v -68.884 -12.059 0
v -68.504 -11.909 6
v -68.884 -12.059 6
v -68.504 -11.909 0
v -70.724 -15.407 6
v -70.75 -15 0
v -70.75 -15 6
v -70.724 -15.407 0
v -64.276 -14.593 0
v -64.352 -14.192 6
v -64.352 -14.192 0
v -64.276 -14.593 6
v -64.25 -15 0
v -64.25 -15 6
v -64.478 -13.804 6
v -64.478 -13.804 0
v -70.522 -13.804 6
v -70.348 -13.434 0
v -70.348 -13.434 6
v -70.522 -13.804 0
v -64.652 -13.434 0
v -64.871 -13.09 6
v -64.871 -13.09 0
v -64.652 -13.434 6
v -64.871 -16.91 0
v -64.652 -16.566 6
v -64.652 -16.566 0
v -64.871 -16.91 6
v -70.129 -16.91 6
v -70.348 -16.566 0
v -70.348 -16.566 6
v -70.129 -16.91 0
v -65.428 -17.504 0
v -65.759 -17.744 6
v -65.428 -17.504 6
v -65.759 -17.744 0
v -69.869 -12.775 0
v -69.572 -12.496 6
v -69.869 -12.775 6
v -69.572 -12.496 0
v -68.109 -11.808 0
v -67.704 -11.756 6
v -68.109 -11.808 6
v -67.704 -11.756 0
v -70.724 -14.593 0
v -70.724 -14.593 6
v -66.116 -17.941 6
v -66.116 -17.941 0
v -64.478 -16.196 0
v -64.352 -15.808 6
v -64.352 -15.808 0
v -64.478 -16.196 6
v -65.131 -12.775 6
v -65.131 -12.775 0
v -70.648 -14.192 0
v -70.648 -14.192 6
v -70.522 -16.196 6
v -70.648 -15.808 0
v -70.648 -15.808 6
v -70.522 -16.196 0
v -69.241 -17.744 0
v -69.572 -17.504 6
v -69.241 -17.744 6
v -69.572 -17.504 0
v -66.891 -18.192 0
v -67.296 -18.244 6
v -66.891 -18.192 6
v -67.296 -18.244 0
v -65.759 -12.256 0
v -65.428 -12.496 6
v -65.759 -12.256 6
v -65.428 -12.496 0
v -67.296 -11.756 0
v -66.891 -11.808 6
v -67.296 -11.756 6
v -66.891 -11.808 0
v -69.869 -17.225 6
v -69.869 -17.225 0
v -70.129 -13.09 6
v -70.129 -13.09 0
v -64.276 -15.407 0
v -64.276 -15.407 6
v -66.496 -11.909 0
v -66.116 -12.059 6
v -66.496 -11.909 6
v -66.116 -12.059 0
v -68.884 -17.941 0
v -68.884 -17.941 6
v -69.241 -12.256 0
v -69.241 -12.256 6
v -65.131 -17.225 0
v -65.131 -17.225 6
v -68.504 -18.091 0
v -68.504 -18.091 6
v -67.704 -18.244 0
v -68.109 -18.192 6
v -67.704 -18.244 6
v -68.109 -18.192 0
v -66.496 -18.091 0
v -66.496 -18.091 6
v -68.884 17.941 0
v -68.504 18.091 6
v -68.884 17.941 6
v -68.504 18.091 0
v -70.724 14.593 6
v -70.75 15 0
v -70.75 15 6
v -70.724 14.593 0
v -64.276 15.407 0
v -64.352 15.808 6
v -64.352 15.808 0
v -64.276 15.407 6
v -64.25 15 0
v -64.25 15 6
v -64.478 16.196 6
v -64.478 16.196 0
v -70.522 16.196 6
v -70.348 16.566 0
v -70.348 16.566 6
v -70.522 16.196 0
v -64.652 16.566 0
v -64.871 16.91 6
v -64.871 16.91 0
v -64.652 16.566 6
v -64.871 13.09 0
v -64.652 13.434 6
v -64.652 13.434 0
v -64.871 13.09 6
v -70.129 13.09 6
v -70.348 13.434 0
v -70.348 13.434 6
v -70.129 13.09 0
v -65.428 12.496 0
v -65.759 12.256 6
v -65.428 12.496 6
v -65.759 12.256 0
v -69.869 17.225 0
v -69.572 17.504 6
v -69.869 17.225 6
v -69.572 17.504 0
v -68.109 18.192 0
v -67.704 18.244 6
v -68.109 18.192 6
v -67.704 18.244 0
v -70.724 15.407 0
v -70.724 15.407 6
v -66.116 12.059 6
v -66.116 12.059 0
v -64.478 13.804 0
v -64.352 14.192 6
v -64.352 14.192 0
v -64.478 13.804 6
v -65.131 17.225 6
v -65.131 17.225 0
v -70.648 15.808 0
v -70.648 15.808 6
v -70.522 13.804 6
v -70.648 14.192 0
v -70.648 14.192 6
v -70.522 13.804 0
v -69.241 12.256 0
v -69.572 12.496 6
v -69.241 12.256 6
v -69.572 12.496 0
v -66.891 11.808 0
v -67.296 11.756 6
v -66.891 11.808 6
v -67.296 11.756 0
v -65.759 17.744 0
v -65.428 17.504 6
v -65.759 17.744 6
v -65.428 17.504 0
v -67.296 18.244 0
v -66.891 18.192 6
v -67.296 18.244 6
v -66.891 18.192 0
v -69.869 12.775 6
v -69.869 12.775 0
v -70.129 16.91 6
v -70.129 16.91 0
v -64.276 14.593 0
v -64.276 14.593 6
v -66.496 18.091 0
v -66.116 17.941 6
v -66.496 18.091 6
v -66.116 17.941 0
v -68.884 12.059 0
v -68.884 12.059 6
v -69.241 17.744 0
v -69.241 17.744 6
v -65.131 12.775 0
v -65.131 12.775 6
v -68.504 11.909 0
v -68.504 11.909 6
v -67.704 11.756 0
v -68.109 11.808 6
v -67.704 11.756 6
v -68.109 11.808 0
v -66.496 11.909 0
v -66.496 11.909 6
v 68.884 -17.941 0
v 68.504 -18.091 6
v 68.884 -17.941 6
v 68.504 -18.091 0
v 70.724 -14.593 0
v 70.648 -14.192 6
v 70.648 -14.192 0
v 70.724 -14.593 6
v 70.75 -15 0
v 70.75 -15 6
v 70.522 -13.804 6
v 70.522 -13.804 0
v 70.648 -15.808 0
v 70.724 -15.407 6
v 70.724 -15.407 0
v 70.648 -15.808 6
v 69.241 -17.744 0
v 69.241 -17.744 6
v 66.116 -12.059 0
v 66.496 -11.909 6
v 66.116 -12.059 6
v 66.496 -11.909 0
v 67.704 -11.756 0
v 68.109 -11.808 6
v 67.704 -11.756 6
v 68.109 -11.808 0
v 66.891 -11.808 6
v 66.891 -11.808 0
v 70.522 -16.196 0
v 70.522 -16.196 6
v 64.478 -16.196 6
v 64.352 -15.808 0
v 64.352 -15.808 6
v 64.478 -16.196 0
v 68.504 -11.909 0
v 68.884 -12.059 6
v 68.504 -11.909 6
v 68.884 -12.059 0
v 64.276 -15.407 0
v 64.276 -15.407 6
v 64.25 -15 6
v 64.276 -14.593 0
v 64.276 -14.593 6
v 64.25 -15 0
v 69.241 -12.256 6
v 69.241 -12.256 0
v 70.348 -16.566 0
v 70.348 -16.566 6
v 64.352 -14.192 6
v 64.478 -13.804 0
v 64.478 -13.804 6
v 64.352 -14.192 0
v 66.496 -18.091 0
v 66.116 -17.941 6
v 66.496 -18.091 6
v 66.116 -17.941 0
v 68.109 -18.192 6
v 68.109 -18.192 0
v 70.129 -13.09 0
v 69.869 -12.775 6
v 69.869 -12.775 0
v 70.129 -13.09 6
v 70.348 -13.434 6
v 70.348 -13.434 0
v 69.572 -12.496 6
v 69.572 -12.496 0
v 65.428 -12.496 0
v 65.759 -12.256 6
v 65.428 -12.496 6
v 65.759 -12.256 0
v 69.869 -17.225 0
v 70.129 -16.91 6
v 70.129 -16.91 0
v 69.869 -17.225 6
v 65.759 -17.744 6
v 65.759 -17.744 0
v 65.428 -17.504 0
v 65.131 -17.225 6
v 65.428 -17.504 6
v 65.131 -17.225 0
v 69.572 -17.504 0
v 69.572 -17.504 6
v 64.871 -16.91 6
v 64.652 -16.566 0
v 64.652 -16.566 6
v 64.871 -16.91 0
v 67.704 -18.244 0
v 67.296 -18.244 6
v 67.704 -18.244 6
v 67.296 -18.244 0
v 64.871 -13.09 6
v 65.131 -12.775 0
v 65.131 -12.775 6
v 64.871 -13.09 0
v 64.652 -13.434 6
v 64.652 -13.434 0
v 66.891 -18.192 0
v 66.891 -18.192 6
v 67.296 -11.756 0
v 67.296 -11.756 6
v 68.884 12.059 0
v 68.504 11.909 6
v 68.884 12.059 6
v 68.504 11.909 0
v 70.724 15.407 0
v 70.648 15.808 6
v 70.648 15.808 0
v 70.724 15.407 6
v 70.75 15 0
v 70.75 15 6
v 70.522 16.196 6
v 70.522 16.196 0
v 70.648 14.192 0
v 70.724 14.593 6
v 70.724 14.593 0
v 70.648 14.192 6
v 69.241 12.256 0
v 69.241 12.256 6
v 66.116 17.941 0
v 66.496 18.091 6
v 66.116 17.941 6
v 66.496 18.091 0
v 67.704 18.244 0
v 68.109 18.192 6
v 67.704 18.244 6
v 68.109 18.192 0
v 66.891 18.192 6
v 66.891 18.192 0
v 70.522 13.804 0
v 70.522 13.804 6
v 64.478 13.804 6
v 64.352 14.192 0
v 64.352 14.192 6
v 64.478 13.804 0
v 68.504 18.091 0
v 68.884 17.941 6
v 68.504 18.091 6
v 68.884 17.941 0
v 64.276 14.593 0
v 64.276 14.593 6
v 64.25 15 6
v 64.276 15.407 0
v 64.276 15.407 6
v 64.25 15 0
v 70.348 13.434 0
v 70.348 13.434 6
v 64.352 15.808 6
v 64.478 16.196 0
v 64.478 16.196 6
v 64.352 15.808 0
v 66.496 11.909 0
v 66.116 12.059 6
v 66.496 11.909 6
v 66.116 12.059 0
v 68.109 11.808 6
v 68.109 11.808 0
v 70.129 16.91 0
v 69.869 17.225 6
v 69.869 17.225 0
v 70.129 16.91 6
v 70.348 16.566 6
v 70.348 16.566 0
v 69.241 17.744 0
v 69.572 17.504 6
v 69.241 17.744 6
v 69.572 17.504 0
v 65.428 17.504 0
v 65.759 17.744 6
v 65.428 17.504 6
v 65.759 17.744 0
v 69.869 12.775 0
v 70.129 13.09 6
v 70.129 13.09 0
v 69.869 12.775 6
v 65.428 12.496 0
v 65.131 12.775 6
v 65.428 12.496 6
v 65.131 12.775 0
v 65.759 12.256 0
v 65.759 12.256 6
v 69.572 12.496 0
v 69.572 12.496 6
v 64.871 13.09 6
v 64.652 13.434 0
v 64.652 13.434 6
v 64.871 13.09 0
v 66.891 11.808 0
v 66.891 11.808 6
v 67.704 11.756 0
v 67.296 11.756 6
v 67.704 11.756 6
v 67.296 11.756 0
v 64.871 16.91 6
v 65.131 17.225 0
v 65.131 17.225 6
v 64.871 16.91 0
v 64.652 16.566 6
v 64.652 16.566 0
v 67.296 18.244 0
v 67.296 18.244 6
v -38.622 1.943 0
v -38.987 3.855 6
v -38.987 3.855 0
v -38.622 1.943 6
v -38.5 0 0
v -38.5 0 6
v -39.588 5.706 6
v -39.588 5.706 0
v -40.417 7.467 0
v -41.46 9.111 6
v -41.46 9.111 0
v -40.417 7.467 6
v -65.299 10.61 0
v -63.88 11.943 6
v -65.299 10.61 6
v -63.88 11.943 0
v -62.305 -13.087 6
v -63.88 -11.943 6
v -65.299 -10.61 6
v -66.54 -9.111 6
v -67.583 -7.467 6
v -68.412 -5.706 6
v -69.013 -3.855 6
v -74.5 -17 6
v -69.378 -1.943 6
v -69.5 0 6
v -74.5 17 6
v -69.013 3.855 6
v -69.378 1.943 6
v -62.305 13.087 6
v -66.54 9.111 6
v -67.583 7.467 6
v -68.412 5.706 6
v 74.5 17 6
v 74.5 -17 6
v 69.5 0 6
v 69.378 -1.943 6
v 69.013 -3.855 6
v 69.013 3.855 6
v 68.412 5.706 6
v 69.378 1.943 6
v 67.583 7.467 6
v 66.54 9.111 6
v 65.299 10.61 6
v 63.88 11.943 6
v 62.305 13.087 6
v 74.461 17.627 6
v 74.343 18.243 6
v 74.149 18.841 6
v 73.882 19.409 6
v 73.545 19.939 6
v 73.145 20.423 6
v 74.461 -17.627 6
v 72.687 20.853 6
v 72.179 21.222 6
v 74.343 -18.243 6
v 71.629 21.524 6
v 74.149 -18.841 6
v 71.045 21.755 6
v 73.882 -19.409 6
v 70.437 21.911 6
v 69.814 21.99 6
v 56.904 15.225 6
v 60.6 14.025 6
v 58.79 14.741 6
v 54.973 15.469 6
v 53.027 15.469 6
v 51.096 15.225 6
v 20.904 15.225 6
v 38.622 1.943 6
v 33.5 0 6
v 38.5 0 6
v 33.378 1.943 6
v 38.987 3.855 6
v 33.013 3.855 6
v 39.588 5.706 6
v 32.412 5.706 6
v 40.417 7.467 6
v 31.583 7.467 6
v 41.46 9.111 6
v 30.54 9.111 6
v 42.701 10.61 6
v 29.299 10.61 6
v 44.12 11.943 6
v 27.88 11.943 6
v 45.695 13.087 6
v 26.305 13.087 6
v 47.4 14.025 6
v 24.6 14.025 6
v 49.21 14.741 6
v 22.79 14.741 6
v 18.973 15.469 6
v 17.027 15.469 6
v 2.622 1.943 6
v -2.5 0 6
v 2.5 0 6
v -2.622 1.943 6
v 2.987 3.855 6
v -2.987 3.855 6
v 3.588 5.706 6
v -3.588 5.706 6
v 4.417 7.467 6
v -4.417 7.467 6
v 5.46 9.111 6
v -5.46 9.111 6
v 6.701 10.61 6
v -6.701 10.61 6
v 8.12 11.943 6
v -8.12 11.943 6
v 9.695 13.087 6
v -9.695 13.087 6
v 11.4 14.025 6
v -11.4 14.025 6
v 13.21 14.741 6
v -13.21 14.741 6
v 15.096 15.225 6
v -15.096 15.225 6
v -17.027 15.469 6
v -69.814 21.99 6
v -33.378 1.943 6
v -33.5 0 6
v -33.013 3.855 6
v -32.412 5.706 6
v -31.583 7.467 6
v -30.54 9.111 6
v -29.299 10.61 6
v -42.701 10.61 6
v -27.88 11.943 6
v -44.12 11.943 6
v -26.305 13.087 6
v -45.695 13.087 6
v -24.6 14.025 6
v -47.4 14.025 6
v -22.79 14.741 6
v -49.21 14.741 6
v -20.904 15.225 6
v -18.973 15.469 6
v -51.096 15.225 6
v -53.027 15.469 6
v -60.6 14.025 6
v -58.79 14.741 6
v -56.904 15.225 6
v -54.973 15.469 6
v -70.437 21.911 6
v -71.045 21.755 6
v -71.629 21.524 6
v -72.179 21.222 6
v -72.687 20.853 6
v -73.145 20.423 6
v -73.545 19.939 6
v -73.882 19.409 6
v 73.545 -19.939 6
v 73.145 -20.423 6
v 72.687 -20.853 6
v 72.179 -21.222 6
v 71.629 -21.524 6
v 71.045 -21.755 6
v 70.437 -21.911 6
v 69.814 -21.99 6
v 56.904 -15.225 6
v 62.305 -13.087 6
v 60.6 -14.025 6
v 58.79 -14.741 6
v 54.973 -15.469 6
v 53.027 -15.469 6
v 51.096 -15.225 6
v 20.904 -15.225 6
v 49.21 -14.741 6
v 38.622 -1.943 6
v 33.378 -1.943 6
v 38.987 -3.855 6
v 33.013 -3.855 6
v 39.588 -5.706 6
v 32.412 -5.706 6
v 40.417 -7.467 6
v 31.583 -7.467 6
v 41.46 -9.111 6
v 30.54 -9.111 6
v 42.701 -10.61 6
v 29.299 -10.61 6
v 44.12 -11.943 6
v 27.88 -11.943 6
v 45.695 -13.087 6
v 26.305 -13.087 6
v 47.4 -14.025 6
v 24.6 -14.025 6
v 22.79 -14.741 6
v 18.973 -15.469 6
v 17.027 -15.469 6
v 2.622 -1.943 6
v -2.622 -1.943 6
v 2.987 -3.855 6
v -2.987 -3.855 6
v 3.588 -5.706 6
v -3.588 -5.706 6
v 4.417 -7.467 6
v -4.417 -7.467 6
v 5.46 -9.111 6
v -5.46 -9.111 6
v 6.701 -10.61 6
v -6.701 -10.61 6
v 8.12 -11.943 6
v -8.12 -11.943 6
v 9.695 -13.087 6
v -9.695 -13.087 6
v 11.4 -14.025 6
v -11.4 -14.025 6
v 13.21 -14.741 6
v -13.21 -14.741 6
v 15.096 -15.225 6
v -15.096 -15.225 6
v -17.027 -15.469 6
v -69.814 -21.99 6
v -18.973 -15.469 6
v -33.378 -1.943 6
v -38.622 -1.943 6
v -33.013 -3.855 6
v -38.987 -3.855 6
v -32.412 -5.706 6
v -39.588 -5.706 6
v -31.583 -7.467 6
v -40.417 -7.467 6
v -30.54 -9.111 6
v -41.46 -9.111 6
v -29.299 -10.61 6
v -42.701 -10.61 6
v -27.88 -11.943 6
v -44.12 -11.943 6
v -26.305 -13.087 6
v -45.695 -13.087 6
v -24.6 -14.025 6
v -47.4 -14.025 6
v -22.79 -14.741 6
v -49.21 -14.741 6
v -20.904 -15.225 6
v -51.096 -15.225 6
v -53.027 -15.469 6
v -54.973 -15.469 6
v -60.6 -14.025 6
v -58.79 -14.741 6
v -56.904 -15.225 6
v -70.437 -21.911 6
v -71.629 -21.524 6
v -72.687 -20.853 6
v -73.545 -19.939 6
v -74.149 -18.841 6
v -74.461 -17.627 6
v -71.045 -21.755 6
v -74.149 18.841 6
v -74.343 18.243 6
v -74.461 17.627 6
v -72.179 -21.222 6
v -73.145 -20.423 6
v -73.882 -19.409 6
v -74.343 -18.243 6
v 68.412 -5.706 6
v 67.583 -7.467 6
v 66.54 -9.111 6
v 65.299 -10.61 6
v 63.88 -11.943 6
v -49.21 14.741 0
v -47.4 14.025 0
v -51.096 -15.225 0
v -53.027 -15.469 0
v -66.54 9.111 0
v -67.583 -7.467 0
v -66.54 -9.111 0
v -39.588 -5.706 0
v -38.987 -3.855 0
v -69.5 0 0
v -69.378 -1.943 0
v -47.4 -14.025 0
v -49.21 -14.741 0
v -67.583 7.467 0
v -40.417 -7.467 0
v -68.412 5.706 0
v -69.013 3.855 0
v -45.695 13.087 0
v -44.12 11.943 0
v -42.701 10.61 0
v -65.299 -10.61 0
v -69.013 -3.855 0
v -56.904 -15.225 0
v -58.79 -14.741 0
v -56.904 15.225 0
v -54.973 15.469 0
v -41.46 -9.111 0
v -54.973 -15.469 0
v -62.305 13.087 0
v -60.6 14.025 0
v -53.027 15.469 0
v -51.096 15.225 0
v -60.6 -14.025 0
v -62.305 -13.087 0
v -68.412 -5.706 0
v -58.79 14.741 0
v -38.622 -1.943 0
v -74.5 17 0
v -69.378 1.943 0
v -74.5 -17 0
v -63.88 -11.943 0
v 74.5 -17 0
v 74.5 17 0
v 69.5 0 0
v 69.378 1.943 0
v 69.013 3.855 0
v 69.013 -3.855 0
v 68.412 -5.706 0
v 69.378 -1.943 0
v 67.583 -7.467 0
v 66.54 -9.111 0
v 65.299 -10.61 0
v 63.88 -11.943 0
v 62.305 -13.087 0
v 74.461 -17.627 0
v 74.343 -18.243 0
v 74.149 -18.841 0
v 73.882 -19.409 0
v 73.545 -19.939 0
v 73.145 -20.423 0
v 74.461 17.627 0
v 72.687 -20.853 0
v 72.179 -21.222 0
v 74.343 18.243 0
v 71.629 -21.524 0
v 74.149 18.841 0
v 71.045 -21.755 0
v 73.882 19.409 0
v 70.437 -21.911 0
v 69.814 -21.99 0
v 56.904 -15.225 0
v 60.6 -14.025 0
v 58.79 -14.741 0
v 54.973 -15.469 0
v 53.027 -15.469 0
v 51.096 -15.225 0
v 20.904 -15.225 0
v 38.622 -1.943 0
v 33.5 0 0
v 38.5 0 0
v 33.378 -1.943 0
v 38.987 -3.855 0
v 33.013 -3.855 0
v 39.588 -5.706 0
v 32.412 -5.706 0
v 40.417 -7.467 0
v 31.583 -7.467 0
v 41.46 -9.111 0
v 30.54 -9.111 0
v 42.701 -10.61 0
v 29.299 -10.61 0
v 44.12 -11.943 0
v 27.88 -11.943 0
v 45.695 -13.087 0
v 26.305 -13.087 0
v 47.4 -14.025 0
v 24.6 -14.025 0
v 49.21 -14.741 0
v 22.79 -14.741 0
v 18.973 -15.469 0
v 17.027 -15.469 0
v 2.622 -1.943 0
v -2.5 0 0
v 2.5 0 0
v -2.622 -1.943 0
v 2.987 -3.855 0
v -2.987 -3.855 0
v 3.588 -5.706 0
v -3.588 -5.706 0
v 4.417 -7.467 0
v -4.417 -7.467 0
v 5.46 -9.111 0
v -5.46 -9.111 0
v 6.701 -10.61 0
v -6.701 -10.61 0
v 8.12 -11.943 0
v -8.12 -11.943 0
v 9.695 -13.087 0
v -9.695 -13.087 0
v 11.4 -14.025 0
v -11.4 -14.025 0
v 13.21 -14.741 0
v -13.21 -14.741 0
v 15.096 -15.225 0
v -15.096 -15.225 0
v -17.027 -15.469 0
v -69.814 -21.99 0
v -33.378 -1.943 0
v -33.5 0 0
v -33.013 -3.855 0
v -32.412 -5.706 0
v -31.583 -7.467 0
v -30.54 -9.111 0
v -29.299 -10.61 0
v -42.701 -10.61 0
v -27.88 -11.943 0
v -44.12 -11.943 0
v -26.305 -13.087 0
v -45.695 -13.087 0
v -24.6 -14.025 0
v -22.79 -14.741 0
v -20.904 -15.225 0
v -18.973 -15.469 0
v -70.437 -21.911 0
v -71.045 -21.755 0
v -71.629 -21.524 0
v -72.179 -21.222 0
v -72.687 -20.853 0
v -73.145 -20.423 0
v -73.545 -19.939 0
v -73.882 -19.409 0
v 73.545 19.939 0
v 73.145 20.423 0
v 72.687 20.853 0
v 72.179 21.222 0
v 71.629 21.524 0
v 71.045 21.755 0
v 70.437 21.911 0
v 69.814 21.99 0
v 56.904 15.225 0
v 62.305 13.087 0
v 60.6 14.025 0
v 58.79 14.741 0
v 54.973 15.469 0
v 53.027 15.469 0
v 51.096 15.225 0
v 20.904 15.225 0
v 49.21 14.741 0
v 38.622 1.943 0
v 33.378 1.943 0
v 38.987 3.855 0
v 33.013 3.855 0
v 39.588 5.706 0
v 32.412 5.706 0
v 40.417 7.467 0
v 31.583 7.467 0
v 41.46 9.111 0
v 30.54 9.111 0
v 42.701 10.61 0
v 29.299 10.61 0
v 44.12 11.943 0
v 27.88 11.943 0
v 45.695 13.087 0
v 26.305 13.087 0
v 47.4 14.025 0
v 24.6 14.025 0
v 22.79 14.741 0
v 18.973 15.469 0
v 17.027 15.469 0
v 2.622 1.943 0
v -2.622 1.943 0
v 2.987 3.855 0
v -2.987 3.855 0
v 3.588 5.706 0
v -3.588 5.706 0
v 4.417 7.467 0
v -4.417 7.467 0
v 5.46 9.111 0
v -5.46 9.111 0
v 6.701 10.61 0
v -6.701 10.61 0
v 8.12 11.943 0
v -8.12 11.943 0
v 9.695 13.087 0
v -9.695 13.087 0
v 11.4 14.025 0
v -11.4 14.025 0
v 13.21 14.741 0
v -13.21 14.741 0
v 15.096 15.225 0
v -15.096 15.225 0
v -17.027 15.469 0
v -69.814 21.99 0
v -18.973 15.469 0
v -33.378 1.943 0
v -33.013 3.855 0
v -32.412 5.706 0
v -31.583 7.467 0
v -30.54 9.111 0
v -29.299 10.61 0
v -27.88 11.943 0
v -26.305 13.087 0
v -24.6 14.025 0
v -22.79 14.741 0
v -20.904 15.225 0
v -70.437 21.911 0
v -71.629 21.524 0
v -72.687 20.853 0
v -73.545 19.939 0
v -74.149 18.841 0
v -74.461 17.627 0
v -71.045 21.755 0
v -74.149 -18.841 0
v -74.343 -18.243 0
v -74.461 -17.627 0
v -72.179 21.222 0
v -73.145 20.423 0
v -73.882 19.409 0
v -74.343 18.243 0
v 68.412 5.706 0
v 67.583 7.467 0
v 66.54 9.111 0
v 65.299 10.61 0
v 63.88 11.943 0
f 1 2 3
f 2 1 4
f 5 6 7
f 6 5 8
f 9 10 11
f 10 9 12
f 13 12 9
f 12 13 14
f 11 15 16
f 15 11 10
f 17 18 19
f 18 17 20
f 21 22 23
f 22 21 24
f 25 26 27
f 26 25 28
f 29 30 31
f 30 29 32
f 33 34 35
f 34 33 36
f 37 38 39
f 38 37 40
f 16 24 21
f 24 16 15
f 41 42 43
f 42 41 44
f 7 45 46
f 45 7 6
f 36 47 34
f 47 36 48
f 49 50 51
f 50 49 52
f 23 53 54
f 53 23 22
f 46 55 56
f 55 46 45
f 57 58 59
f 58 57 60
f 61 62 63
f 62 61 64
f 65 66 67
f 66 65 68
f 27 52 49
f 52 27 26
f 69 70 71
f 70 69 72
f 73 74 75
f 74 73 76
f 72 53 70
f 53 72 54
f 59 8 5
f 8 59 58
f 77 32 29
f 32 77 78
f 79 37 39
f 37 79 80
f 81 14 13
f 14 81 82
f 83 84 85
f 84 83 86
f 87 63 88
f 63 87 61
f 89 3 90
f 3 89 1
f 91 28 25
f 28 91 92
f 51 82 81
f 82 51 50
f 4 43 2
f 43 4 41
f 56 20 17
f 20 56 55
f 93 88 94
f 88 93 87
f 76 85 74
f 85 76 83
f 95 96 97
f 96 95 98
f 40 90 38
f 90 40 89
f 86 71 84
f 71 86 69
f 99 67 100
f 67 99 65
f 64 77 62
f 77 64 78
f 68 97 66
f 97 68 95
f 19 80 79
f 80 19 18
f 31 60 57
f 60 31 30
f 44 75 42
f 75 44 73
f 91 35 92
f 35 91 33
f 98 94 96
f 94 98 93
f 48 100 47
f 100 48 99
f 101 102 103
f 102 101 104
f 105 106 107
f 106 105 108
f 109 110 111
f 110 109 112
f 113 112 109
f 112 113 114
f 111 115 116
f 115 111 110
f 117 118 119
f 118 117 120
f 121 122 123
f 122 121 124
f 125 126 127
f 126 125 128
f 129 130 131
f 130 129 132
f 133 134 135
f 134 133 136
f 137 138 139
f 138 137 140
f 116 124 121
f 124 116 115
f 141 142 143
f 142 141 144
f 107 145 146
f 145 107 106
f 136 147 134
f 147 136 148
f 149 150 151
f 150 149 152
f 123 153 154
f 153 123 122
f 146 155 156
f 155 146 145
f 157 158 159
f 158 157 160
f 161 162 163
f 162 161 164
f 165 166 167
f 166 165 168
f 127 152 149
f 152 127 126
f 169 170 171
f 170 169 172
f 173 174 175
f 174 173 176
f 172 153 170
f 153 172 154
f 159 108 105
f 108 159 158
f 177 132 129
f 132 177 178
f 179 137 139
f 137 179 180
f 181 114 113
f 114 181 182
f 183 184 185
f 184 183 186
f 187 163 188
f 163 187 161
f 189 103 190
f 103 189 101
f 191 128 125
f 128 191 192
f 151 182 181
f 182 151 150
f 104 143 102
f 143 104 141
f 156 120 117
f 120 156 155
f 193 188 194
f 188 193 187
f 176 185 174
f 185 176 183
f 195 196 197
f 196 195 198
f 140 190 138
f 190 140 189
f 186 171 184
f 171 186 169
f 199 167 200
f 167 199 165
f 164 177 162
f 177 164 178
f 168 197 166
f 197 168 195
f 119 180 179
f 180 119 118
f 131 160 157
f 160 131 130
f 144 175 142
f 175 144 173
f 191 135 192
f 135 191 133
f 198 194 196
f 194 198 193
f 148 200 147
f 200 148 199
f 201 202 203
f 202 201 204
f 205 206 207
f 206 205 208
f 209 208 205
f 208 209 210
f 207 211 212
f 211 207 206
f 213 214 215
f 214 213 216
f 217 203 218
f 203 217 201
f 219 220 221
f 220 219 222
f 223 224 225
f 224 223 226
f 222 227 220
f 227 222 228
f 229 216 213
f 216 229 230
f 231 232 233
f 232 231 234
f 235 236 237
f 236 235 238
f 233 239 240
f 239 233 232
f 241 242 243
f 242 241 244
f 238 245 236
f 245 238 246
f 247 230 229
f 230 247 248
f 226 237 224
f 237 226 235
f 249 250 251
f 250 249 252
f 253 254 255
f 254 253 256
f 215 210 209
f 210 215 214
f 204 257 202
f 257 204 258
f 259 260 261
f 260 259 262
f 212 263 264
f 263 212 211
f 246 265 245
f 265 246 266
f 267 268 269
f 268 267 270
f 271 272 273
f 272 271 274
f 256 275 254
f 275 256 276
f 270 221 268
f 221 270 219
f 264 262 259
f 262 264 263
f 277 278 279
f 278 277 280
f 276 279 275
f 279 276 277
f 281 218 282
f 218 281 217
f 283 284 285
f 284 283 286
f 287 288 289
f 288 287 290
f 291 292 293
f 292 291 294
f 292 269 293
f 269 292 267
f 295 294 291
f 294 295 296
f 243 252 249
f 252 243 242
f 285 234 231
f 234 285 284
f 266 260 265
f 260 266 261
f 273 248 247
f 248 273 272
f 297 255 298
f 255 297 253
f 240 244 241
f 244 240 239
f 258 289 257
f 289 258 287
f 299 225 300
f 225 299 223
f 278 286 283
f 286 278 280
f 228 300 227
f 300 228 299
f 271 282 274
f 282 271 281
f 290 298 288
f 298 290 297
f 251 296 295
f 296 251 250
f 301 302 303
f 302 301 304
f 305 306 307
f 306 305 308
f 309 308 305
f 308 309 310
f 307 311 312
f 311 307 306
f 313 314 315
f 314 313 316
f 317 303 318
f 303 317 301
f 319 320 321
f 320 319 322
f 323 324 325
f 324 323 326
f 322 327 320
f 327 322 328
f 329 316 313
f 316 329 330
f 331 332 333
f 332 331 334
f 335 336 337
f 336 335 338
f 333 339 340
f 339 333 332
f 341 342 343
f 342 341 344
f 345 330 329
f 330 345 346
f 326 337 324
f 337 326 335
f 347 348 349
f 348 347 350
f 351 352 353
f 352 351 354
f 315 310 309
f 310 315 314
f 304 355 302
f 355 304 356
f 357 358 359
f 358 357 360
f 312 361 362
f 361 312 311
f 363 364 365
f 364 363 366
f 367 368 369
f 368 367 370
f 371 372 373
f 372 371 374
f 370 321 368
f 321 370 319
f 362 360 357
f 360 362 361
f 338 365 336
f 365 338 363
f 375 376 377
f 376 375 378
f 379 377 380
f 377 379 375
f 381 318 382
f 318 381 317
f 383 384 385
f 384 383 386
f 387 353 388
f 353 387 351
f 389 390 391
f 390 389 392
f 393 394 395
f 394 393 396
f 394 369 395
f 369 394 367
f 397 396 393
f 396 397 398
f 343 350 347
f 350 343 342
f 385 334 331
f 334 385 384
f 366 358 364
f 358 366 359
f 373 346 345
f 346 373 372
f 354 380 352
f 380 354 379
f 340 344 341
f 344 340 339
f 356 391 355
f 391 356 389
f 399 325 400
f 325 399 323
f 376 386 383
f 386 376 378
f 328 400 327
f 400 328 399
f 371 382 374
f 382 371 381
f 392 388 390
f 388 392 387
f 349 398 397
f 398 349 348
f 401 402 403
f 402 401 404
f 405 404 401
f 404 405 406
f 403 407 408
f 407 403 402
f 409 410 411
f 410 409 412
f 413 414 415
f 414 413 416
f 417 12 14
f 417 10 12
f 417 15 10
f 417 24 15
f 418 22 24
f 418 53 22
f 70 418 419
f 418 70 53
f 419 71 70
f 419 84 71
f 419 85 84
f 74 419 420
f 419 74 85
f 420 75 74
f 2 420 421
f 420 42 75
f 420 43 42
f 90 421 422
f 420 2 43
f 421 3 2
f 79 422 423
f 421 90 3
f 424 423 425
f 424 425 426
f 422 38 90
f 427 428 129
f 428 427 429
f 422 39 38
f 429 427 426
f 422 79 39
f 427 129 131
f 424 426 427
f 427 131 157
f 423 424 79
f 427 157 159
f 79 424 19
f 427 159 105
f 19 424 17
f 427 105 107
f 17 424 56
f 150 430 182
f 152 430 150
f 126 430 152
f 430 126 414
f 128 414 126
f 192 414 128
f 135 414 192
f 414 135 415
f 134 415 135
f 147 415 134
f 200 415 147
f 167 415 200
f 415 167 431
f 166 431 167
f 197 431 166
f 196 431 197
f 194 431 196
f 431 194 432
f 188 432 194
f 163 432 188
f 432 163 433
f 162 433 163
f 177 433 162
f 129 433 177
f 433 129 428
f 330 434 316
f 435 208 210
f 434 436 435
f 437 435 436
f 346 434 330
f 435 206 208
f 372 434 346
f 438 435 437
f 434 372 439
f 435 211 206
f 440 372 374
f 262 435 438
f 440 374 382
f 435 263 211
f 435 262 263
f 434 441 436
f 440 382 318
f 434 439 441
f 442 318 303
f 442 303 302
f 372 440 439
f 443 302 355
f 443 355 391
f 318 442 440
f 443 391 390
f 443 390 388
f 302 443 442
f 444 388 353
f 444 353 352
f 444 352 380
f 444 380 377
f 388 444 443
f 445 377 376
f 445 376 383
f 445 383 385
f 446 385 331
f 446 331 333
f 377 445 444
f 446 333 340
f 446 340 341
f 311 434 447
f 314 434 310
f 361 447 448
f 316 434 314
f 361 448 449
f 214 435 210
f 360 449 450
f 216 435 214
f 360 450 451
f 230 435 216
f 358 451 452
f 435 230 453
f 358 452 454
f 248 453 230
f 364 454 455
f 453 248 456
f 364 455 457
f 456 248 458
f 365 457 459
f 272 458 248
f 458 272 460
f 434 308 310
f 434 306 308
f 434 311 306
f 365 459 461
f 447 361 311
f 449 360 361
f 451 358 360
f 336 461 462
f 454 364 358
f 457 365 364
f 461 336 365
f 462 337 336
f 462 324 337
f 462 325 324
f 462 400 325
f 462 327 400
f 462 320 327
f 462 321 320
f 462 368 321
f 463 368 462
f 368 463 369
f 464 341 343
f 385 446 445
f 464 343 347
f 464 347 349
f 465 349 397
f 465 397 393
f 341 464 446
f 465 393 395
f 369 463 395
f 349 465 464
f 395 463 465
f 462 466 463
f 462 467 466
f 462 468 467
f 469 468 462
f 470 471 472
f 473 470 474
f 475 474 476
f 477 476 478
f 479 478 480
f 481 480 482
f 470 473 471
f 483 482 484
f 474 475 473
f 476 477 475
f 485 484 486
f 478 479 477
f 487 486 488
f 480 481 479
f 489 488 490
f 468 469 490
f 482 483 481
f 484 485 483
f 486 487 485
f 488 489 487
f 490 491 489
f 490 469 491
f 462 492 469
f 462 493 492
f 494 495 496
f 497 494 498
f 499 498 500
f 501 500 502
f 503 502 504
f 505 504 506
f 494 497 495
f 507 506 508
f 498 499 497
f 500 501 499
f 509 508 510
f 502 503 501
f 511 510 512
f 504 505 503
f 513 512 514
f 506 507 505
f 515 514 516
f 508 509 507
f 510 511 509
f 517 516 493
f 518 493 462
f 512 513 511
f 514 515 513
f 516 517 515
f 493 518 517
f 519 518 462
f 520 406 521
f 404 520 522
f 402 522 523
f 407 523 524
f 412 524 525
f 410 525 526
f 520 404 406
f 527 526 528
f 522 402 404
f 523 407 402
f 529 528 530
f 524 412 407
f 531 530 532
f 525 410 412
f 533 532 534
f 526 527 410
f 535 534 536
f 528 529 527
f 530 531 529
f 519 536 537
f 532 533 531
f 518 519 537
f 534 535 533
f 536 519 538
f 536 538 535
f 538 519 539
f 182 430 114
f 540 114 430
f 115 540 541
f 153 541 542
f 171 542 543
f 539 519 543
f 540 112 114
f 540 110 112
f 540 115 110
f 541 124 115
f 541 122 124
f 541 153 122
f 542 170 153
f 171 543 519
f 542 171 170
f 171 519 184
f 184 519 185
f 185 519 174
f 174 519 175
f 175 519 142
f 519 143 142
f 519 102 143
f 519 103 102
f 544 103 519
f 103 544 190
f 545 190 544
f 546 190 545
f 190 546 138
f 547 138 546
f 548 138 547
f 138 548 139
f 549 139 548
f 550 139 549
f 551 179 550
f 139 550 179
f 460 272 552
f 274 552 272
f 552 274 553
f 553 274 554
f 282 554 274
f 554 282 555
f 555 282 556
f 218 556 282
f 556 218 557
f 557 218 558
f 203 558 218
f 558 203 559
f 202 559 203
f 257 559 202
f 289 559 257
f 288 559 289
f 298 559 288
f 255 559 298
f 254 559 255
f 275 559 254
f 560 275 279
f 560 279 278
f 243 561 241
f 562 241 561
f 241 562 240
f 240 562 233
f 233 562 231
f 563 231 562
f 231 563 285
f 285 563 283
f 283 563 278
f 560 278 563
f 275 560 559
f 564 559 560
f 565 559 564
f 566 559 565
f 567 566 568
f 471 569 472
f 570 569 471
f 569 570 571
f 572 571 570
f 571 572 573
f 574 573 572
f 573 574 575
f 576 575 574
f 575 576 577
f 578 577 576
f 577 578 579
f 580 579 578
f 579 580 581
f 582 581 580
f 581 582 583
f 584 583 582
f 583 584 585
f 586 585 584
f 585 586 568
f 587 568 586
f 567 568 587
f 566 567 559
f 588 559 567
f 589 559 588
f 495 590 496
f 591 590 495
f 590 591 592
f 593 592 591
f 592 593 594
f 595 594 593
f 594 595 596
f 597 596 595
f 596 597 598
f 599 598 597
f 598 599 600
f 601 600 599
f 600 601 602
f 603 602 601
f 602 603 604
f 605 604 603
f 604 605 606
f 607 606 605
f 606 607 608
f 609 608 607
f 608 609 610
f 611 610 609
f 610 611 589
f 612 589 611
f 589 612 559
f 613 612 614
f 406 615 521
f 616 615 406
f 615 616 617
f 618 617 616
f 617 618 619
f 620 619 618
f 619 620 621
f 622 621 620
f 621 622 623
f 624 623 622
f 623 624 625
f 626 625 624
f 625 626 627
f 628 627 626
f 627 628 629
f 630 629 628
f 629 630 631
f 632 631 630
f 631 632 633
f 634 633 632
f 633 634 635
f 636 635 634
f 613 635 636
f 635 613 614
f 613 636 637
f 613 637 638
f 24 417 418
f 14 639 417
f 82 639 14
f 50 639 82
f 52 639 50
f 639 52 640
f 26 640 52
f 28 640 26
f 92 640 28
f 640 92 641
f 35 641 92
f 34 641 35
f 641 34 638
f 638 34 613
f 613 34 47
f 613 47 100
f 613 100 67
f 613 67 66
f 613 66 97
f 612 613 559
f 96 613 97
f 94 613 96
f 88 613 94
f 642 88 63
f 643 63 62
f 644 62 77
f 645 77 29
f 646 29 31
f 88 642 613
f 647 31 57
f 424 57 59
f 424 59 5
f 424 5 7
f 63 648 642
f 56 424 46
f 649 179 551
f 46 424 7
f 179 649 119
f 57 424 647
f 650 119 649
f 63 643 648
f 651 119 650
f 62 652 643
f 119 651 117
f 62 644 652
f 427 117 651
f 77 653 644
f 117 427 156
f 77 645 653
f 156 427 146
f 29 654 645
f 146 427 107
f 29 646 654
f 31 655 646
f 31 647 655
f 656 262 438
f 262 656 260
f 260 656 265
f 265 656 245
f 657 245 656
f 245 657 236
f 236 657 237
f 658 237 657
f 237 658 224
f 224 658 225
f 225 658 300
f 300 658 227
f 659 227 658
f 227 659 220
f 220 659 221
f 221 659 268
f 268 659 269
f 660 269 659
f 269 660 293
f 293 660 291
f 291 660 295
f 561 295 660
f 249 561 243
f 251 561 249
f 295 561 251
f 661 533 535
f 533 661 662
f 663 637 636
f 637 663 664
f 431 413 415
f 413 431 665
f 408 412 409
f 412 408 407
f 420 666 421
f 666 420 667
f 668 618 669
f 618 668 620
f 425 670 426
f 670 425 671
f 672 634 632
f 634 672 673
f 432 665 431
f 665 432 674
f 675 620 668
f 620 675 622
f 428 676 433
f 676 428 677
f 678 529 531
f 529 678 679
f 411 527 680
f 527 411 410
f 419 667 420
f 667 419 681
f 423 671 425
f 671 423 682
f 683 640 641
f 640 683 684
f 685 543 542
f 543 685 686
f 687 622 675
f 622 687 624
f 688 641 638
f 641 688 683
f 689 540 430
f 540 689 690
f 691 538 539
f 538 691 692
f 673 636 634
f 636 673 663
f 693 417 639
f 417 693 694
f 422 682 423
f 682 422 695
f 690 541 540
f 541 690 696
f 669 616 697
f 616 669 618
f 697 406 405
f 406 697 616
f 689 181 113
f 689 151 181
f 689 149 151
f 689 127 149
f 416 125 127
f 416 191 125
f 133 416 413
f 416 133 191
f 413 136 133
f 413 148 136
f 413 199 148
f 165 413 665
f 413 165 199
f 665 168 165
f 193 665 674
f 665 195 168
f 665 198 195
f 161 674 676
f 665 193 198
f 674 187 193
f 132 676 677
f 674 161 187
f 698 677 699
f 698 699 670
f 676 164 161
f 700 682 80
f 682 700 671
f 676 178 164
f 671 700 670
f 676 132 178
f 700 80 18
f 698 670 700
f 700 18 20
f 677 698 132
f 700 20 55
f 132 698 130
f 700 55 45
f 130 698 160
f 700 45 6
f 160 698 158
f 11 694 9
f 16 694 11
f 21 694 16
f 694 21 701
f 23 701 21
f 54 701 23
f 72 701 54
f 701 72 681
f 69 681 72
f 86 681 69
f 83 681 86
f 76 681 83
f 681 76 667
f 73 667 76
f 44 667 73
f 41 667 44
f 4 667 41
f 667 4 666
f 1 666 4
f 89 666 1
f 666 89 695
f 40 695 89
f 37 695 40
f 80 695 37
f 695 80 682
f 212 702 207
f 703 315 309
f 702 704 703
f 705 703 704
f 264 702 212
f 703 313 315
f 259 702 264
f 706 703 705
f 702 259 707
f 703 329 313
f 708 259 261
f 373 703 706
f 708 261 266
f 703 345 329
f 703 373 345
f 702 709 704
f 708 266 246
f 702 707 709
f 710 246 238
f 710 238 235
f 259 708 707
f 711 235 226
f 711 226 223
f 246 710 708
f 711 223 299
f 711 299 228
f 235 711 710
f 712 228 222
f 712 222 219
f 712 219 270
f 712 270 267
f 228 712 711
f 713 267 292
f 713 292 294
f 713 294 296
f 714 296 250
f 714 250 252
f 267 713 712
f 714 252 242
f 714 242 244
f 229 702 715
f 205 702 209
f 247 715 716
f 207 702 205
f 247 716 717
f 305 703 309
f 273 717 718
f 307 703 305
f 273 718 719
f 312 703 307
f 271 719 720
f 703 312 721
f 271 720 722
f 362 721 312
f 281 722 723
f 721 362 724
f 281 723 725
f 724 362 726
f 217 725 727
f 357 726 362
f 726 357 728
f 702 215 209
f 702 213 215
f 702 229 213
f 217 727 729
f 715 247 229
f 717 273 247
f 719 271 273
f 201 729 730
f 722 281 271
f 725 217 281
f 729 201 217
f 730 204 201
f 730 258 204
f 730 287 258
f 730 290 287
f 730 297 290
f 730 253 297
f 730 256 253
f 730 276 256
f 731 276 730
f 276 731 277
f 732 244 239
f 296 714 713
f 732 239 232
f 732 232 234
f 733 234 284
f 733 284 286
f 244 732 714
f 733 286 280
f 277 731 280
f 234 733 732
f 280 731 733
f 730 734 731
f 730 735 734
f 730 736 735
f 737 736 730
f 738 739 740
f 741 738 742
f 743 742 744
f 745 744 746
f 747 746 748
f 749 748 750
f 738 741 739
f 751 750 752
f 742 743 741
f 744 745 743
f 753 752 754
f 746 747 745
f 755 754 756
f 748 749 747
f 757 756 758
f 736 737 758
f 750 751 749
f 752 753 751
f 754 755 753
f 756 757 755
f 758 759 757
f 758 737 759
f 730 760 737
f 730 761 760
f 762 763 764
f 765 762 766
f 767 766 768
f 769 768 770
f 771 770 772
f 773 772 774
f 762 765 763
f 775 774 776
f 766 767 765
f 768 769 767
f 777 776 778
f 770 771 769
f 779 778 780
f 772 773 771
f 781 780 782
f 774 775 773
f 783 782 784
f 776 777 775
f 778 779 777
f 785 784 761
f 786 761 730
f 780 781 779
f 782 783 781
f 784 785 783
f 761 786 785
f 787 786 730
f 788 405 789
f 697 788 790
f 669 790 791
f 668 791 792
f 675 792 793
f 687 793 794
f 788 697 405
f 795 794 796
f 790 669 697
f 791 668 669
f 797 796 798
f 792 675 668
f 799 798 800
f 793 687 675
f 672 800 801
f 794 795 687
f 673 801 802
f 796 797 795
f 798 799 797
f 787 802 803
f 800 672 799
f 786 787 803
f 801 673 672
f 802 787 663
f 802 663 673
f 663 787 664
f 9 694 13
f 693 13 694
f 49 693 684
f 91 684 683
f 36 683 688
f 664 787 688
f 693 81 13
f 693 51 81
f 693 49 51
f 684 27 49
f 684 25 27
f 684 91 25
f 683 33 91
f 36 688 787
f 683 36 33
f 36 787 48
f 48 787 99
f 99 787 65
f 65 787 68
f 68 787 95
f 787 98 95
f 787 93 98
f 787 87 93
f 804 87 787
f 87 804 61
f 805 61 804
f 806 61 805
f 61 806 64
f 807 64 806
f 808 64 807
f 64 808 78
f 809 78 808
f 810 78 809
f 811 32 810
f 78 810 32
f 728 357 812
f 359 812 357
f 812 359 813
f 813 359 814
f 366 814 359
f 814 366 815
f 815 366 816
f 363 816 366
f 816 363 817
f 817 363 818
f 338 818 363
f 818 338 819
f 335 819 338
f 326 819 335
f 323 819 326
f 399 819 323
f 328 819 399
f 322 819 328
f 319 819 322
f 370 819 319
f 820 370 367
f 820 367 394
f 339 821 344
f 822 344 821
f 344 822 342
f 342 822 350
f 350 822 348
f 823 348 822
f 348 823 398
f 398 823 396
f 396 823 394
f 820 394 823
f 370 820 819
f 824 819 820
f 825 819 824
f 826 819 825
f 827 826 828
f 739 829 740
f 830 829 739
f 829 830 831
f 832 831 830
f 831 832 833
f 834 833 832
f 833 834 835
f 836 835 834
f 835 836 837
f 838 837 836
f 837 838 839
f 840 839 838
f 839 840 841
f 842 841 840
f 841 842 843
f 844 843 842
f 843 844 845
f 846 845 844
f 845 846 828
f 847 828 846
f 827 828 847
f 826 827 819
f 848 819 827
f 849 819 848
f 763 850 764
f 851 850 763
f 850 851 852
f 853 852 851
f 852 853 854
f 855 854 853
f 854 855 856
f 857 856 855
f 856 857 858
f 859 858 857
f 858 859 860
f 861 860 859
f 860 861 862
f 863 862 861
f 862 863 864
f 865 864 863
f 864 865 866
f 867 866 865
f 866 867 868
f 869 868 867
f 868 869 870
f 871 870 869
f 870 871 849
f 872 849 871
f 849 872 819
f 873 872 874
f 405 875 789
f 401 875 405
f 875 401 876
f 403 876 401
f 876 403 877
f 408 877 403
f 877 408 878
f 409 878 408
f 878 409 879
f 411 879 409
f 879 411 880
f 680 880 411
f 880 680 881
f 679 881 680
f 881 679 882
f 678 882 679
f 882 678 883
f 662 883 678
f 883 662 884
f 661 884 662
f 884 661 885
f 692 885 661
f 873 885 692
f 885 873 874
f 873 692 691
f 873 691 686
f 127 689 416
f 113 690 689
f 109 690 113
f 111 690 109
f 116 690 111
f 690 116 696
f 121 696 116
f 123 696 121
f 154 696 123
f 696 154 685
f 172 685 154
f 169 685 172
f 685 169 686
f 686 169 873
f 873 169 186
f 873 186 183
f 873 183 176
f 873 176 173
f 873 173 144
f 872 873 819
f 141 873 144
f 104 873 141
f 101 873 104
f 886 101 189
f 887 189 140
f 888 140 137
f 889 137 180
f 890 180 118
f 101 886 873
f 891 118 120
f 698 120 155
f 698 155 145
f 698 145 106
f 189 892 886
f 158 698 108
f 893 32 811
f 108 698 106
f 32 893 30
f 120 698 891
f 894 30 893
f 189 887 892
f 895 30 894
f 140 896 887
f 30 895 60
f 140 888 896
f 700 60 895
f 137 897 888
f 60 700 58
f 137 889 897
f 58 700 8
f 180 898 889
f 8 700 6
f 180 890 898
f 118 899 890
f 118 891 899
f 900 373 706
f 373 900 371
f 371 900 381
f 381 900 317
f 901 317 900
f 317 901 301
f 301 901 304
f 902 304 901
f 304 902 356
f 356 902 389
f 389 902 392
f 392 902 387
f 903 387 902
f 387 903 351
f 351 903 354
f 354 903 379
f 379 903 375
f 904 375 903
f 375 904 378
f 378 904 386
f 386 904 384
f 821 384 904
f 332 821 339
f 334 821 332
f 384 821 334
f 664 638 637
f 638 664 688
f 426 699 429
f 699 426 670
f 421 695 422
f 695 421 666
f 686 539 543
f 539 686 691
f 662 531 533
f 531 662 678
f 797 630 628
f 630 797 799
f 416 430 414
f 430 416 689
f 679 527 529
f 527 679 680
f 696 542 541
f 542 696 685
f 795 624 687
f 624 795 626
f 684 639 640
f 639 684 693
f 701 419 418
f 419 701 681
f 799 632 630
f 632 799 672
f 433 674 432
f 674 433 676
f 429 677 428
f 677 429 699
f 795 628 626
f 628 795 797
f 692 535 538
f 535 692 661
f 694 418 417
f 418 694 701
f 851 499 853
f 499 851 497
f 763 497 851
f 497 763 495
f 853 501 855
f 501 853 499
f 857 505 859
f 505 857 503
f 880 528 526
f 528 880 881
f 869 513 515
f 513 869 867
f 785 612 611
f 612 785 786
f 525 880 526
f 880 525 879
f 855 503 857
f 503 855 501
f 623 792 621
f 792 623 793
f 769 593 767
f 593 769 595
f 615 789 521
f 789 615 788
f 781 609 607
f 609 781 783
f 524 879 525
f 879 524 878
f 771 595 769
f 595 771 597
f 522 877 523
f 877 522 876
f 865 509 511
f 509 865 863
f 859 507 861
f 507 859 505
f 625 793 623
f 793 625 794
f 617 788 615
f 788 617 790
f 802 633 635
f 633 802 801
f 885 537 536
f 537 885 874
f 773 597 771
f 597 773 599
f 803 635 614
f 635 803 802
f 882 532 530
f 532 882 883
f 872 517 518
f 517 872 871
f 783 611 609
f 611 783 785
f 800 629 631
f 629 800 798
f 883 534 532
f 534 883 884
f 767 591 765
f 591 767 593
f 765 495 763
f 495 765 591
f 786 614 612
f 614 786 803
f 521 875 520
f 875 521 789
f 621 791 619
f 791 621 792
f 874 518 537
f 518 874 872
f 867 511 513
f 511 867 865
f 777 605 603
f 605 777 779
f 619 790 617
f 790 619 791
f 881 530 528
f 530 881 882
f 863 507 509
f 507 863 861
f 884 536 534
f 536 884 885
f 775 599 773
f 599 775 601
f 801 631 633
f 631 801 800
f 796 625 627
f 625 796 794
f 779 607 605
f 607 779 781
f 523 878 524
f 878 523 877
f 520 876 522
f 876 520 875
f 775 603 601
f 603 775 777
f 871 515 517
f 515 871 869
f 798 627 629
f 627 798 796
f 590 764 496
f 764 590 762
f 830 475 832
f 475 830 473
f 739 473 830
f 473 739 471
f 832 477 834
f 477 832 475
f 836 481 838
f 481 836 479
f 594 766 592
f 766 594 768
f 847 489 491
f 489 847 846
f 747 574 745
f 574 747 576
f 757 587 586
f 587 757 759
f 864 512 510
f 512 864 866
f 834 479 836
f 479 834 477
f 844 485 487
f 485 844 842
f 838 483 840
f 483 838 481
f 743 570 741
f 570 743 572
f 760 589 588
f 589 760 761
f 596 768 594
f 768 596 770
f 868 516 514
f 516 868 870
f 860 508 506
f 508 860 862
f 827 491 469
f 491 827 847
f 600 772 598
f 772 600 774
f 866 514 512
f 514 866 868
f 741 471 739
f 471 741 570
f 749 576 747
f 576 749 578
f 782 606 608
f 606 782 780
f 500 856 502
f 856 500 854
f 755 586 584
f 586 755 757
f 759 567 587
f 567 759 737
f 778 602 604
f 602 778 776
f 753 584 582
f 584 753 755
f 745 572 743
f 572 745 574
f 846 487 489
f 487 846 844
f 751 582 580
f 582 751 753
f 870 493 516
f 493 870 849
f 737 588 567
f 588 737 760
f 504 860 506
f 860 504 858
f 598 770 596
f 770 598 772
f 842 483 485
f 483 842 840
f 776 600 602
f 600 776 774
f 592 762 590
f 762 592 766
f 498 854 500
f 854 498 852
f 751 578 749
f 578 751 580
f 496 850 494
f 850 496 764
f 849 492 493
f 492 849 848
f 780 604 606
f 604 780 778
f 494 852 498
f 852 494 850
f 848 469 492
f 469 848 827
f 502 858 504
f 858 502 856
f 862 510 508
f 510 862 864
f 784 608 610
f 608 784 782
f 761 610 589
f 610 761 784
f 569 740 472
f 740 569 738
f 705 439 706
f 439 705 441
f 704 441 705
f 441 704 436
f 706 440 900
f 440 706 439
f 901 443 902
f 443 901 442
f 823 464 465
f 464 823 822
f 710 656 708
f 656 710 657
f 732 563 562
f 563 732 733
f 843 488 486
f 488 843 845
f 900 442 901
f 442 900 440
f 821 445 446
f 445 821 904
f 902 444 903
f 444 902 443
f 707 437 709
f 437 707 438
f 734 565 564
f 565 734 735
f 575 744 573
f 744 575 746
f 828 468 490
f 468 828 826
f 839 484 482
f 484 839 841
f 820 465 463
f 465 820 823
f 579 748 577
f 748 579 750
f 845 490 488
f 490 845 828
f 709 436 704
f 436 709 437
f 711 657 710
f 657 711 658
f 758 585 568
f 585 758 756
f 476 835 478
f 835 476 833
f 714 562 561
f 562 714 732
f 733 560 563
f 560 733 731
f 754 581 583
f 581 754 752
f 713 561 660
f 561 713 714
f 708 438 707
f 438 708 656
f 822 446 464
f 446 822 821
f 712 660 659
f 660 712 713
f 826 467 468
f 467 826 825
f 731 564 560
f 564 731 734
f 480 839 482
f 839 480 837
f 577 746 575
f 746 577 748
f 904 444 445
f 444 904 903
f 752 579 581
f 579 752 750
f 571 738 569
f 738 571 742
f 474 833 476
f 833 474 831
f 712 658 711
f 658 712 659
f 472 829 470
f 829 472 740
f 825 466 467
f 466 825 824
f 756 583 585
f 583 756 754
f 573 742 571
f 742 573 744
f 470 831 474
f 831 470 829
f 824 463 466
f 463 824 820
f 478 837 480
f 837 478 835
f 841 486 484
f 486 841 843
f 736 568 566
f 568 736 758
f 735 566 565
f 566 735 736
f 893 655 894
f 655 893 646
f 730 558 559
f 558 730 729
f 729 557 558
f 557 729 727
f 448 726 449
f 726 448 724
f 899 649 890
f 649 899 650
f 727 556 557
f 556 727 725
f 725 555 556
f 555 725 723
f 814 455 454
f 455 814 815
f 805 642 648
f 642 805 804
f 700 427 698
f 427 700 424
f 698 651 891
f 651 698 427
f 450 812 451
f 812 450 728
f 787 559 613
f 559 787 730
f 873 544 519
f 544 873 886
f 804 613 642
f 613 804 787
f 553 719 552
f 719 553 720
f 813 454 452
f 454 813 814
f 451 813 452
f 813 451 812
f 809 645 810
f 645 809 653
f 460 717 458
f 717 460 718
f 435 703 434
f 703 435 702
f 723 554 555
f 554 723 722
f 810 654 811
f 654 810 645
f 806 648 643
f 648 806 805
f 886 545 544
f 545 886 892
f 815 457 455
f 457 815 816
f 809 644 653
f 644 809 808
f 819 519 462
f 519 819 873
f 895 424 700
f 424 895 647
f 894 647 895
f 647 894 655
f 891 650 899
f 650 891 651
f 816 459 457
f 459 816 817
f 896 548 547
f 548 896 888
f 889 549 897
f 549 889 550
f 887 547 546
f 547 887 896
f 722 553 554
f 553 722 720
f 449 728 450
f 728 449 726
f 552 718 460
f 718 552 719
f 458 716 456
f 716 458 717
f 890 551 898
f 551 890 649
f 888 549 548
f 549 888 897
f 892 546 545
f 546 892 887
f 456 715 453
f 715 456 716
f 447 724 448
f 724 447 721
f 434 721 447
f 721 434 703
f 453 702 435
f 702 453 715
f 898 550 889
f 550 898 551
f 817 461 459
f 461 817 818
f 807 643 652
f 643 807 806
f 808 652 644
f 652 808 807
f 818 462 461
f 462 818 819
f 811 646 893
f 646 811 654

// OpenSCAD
$fn = 50;

difference() {
	union() {
		hull() {
			translate(v = [-69.5, 17.0, 0]) {
				cylinder(h = 6, r = 5);
			}
			translate(v = [69.5, 17.0, 0]) {
				cylinder(h = 6, r = 5);
			}
			translate(v = [-69.5, -17.0, 0]) {
				cylinder(h = 6, r = 5);
			}
			translate(v = [69.5, -17.0, 0]) {
				cylinder(h = 6, r = 5);
			}
		}
	}
	union() {
		translate(v = [-67.5, -15.0, -100.0]) {
			cylinder(h = 200, r = 3.25);
		}
		translate(v = [-67.5, 15.0, -100.0]) {
			cylinder(h = 200, r = 3.25);
		}
		translate(v = [67.5, -15.0, -100.0]) {
			cylinder(h = 200, r = 3.25);
		}
		translate(v = [67.5, 15.0, -100.0]) {
			cylinder(h = 200, r = 3.25);
		}
		translate(v = [-67.5, -15.0, -100.0]) {
			cylinder(h = 200, r = 1.8);
		}
		translate(v = [-67.5, 15.0, -100.0]) {
			cylinder(h = 200, r = 1.8);
		}
		translate(v = [67.5, -15.0, -100.0]) {
			cylinder(h = 200, r = 1.8);
		}
		translate(v = [67.5, 15.0, -100.0]) {
			cylinder(h = 200, r = 1.8);
		}
		translate(v = [-54.0, 0, 0.0]) {
			cylinder(h = 6, r = 15.5);
		}
		translate(v = [-18.0, 0, 0.0]) {
			cylinder(h = 6, r = 15.5);
		}
		translate(v = [18.0, 0, 0.0]) {
			cylinder(h = 6, r = 15.5);
		}
		translate(v = [54.0, 0, 0.0]) {
			cylinder(h = 6, r = 15.5);
		}
	}
}
